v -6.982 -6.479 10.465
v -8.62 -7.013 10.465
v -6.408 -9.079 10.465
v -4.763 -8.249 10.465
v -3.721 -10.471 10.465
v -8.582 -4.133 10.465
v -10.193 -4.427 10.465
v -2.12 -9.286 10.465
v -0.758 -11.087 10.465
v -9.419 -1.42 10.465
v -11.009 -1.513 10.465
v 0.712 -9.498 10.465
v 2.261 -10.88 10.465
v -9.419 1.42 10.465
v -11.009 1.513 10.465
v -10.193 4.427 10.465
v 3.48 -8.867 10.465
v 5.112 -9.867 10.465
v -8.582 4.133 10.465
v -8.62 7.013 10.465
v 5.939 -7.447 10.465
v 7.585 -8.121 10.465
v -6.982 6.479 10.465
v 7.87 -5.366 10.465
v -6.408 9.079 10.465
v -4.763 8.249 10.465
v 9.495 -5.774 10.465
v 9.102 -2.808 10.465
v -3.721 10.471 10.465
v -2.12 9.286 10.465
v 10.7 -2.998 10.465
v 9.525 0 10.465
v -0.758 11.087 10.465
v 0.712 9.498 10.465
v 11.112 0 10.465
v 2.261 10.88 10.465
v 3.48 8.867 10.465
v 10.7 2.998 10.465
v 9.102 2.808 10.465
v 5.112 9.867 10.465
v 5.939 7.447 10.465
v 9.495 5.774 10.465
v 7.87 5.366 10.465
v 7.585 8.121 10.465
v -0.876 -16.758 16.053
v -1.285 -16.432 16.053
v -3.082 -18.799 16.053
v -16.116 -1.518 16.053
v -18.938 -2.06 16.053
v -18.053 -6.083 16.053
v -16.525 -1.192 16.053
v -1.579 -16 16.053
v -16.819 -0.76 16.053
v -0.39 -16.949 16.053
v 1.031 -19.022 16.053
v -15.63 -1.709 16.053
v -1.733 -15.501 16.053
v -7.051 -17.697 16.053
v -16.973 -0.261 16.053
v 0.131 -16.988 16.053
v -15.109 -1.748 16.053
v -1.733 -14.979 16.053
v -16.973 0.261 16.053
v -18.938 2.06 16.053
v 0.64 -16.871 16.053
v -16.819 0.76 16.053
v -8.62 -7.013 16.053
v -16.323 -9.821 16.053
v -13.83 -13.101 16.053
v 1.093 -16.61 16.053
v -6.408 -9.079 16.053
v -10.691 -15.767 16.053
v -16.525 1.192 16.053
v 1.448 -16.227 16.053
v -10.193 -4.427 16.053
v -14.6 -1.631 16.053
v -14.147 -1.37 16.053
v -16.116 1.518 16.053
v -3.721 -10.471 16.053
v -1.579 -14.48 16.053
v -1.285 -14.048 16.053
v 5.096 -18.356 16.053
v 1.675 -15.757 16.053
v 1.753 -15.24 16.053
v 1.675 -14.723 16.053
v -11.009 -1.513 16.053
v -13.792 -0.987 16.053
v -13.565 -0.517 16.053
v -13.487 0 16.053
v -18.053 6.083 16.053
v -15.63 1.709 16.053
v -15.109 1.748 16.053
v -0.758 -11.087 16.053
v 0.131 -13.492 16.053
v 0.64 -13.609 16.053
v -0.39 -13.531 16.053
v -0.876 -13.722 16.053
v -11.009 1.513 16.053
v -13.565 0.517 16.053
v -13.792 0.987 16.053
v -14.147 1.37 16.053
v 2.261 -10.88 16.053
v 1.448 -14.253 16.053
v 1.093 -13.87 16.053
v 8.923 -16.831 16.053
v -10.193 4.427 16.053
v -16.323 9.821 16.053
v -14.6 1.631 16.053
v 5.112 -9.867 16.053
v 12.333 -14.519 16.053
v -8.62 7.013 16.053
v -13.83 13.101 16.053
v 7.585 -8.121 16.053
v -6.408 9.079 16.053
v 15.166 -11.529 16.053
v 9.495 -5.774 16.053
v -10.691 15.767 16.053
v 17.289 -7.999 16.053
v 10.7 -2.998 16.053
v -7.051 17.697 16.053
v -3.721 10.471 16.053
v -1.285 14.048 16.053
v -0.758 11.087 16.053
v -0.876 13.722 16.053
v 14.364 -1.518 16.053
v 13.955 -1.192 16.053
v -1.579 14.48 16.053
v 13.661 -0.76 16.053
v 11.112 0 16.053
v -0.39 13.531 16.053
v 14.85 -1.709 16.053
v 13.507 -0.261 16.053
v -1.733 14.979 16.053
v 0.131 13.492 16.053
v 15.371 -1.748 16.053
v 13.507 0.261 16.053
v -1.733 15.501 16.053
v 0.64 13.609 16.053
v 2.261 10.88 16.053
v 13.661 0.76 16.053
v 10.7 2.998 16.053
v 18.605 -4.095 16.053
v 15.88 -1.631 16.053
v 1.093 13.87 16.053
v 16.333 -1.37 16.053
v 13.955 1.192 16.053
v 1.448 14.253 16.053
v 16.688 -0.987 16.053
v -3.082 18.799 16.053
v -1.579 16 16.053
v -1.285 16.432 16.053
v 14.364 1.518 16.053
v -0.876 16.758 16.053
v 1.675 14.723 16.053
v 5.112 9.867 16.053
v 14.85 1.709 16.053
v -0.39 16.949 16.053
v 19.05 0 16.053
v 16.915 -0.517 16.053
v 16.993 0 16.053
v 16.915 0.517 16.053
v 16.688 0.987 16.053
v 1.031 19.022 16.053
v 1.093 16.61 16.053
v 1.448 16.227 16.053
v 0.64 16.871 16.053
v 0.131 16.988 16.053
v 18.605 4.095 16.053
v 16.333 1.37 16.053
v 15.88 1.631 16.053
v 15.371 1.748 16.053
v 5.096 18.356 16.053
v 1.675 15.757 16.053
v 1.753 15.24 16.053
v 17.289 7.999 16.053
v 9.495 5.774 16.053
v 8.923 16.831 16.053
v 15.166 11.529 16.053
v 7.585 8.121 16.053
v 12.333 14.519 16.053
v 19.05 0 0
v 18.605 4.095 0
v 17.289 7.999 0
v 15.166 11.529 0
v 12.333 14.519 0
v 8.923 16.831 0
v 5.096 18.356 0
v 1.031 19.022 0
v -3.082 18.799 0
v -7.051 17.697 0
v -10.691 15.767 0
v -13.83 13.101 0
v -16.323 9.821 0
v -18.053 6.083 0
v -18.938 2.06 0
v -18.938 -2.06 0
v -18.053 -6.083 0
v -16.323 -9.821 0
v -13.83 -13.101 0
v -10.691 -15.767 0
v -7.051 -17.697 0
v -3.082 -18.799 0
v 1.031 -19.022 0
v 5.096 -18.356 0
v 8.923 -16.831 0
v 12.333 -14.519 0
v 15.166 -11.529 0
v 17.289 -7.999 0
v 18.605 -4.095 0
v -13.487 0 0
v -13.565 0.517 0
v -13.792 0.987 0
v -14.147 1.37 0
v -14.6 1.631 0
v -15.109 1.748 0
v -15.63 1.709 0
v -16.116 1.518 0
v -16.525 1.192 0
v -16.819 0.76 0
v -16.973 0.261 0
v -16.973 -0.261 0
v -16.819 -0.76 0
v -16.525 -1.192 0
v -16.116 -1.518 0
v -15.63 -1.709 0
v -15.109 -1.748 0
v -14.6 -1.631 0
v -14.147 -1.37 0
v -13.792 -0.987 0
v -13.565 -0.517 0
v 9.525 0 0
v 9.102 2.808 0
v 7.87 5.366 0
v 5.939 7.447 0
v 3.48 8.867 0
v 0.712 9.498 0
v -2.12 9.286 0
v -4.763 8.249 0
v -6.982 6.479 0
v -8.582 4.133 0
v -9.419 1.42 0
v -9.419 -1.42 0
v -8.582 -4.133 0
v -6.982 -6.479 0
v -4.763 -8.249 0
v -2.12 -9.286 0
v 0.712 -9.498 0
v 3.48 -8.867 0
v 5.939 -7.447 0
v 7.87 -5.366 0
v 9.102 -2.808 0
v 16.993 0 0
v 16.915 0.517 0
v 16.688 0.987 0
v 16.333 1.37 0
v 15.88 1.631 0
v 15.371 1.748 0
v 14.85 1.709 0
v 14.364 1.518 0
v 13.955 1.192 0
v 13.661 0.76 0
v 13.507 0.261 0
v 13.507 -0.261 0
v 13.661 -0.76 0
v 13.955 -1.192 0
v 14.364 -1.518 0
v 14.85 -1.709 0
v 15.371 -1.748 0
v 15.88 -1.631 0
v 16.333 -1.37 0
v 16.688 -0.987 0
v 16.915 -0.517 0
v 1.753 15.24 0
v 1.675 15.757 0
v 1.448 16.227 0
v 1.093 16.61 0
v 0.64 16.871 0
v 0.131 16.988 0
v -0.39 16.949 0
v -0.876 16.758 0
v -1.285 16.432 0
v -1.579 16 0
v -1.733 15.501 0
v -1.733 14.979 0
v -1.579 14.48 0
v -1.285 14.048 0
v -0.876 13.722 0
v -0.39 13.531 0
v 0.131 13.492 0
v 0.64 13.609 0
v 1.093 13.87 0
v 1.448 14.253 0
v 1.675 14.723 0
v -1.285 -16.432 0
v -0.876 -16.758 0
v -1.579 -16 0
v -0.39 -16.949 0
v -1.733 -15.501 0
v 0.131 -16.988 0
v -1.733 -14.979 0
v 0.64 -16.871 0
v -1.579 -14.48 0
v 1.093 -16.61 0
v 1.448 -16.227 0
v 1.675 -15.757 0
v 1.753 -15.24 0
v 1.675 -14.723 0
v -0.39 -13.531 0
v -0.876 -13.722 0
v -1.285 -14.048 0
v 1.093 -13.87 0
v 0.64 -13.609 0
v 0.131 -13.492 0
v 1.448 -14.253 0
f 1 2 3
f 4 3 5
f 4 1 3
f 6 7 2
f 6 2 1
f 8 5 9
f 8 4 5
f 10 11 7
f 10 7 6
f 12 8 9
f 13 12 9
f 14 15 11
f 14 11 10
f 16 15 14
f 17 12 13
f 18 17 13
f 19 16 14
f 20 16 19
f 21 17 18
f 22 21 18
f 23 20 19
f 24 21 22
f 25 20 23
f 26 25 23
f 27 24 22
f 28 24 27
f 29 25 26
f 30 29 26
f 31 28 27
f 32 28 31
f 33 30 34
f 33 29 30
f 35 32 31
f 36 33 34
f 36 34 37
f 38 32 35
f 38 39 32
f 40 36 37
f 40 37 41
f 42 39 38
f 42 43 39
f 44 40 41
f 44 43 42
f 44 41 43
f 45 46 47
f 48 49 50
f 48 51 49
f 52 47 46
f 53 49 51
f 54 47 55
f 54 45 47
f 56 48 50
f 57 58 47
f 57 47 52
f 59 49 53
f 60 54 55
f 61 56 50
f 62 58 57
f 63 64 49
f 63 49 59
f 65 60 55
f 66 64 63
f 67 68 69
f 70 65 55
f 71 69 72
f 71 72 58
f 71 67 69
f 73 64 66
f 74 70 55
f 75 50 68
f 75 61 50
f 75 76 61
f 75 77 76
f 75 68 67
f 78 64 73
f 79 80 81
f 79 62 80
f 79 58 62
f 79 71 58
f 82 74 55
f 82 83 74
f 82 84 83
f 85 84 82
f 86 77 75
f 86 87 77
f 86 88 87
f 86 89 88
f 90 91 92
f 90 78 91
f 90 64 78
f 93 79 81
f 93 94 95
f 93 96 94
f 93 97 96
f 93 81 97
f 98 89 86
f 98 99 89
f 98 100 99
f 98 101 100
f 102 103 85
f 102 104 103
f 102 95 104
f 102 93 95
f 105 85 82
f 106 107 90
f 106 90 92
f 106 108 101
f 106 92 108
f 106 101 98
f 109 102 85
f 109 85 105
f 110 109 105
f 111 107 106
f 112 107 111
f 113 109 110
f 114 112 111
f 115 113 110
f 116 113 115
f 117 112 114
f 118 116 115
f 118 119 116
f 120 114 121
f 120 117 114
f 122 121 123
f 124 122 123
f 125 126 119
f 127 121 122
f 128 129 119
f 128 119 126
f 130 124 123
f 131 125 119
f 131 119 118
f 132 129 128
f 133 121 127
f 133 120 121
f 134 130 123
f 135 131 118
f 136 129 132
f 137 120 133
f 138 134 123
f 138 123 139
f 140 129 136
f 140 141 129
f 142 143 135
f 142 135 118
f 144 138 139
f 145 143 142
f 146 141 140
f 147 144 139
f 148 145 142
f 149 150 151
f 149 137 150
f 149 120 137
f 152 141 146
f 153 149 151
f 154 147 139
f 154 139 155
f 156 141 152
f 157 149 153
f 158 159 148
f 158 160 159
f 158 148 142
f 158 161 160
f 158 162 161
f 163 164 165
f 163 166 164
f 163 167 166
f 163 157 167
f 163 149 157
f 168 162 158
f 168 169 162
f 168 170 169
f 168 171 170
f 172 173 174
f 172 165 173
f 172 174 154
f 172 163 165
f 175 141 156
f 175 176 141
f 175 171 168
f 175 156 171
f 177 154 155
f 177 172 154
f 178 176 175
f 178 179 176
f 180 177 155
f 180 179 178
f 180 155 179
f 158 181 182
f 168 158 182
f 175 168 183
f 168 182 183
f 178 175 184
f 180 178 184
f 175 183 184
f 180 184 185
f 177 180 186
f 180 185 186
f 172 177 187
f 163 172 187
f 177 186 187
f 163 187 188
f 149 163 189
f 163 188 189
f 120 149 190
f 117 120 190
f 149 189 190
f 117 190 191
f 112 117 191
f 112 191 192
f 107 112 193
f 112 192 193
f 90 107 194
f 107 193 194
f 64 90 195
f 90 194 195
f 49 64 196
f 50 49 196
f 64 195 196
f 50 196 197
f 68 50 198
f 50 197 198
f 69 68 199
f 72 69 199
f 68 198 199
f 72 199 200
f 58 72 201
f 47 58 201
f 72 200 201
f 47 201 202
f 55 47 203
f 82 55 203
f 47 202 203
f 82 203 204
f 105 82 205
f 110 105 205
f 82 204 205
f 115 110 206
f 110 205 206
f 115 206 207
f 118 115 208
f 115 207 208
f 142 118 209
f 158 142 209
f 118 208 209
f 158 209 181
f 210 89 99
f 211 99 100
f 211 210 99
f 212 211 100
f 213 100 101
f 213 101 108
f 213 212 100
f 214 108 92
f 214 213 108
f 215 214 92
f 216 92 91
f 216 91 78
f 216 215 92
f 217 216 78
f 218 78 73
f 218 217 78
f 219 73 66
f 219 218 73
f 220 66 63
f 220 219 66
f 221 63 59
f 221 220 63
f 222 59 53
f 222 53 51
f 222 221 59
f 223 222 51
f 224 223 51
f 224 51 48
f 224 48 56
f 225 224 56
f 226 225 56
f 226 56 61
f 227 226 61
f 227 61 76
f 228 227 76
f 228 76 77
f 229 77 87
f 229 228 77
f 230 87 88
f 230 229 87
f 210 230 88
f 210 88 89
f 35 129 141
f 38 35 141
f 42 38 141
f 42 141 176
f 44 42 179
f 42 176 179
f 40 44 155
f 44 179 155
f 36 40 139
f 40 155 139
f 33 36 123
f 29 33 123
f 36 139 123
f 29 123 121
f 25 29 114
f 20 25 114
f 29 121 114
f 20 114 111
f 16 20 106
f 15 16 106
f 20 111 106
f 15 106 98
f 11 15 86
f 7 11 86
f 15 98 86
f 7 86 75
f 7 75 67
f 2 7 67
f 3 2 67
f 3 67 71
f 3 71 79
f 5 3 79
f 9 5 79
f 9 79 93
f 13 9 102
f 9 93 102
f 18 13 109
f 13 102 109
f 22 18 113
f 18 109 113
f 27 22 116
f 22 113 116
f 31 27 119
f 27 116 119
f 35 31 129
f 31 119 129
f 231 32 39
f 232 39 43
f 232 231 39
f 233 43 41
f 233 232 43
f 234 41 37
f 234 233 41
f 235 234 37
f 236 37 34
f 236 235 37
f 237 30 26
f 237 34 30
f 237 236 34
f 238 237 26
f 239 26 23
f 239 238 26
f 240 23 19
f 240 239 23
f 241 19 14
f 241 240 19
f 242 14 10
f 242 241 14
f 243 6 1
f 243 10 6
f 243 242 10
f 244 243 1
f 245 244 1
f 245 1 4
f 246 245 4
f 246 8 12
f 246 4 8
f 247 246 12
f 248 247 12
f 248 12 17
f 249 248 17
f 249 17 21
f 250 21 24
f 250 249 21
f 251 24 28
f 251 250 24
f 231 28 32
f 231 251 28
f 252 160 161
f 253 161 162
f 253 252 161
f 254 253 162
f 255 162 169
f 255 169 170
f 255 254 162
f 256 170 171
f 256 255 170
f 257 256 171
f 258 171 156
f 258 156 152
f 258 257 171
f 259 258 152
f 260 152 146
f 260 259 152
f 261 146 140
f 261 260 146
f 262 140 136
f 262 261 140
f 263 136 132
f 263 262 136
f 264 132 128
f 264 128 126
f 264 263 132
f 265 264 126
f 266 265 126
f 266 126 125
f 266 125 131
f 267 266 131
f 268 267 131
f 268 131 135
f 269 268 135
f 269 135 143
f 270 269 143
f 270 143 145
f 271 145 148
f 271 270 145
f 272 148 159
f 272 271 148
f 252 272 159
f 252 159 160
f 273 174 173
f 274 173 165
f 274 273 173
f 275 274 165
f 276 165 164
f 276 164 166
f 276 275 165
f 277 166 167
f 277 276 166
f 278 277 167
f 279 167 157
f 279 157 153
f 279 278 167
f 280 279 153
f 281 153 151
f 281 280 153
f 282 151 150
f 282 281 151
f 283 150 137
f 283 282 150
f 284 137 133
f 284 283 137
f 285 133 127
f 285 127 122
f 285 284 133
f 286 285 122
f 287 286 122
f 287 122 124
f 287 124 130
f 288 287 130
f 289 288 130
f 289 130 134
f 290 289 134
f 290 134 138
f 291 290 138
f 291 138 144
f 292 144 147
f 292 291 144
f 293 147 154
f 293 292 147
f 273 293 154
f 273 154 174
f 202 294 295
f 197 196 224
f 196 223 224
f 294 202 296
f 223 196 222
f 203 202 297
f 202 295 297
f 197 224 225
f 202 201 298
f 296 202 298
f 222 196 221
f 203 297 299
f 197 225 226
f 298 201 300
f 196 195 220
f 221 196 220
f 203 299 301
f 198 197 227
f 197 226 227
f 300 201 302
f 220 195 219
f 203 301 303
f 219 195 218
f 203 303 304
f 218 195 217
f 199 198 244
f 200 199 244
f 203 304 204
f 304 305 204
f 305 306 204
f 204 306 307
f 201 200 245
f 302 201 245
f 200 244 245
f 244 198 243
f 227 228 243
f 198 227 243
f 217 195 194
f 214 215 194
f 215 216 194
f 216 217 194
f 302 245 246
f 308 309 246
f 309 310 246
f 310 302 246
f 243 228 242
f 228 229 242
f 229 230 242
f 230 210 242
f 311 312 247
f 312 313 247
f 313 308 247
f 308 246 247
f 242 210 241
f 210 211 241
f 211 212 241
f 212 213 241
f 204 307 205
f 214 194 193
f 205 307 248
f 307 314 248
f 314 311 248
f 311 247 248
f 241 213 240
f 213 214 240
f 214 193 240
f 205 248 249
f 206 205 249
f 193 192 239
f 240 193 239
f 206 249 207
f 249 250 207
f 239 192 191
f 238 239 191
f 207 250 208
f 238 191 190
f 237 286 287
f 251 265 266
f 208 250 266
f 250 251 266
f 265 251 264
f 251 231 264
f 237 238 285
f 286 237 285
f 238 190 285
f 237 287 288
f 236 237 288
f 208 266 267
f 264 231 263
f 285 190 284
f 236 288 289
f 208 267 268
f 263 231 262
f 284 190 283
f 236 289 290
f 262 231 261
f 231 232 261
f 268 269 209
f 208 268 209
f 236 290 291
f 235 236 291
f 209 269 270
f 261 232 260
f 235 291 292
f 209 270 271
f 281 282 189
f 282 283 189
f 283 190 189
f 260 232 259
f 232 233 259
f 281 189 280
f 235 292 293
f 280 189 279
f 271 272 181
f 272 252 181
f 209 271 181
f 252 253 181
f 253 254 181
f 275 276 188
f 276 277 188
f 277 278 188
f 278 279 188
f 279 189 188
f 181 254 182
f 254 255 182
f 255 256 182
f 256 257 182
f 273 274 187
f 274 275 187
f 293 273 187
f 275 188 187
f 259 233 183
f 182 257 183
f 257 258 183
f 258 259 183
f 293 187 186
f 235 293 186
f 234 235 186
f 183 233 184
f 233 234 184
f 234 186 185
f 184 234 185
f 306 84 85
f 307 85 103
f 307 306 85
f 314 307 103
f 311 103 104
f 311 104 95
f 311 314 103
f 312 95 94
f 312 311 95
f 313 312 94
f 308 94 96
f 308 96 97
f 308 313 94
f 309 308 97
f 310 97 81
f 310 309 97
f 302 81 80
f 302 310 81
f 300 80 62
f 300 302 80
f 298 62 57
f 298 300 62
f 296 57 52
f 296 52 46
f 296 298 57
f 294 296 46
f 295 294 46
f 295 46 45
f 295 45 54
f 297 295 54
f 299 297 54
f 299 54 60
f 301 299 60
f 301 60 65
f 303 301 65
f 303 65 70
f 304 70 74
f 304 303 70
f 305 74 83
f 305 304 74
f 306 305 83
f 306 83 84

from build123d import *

# Parameters (mm, degrees)
SKETCH1_R           = 19.05
SKETCH1_R_2         = 9.525
SKETCH1_R_3         = 1.7526
BOSS_EXTRUDE1_DEPTH = 16.0528
SKETCH2_R           = 11.1125
CUT_EXTRUDE2_DEPTH  = 5.588


with BuildPart() as part:
    # Sketch1 → Boss-Extrude1 (new body)
    with BuildSketch(Plane.XY):
        Circle(SKETCH1_R)
        Circle(SKETCH1_R_2, mode=Mode.SUBTRACT)
        with Locations((0, 15.24)):
            Circle(SKETCH1_R_3, mode=Mode.SUBTRACT)
        with Locations((15.24, 0)):
            Circle(SKETCH1_R_3, mode=Mode.SUBTRACT)
        with Locations((0, -15.24)):
            Circle(SKETCH1_R_3, mode=Mode.SUBTRACT)
        with Locations((-15.24, 0)):
            Circle(SKETCH1_R_3, mode=Mode.SUBTRACT)
    extrude(amount=BOSS_EXTRUDE1_DEPTH)

    # Sketch2 → Cut-Extrude2 (cut)
    with BuildSketch(Plane.XY.offset(16.0528)):
        Circle(SKETCH2_R)
    extrude(amount=-CUT_EXTRUDE2_DEPTH, mode=Mode.SUBTRACT)


solid = part.part
